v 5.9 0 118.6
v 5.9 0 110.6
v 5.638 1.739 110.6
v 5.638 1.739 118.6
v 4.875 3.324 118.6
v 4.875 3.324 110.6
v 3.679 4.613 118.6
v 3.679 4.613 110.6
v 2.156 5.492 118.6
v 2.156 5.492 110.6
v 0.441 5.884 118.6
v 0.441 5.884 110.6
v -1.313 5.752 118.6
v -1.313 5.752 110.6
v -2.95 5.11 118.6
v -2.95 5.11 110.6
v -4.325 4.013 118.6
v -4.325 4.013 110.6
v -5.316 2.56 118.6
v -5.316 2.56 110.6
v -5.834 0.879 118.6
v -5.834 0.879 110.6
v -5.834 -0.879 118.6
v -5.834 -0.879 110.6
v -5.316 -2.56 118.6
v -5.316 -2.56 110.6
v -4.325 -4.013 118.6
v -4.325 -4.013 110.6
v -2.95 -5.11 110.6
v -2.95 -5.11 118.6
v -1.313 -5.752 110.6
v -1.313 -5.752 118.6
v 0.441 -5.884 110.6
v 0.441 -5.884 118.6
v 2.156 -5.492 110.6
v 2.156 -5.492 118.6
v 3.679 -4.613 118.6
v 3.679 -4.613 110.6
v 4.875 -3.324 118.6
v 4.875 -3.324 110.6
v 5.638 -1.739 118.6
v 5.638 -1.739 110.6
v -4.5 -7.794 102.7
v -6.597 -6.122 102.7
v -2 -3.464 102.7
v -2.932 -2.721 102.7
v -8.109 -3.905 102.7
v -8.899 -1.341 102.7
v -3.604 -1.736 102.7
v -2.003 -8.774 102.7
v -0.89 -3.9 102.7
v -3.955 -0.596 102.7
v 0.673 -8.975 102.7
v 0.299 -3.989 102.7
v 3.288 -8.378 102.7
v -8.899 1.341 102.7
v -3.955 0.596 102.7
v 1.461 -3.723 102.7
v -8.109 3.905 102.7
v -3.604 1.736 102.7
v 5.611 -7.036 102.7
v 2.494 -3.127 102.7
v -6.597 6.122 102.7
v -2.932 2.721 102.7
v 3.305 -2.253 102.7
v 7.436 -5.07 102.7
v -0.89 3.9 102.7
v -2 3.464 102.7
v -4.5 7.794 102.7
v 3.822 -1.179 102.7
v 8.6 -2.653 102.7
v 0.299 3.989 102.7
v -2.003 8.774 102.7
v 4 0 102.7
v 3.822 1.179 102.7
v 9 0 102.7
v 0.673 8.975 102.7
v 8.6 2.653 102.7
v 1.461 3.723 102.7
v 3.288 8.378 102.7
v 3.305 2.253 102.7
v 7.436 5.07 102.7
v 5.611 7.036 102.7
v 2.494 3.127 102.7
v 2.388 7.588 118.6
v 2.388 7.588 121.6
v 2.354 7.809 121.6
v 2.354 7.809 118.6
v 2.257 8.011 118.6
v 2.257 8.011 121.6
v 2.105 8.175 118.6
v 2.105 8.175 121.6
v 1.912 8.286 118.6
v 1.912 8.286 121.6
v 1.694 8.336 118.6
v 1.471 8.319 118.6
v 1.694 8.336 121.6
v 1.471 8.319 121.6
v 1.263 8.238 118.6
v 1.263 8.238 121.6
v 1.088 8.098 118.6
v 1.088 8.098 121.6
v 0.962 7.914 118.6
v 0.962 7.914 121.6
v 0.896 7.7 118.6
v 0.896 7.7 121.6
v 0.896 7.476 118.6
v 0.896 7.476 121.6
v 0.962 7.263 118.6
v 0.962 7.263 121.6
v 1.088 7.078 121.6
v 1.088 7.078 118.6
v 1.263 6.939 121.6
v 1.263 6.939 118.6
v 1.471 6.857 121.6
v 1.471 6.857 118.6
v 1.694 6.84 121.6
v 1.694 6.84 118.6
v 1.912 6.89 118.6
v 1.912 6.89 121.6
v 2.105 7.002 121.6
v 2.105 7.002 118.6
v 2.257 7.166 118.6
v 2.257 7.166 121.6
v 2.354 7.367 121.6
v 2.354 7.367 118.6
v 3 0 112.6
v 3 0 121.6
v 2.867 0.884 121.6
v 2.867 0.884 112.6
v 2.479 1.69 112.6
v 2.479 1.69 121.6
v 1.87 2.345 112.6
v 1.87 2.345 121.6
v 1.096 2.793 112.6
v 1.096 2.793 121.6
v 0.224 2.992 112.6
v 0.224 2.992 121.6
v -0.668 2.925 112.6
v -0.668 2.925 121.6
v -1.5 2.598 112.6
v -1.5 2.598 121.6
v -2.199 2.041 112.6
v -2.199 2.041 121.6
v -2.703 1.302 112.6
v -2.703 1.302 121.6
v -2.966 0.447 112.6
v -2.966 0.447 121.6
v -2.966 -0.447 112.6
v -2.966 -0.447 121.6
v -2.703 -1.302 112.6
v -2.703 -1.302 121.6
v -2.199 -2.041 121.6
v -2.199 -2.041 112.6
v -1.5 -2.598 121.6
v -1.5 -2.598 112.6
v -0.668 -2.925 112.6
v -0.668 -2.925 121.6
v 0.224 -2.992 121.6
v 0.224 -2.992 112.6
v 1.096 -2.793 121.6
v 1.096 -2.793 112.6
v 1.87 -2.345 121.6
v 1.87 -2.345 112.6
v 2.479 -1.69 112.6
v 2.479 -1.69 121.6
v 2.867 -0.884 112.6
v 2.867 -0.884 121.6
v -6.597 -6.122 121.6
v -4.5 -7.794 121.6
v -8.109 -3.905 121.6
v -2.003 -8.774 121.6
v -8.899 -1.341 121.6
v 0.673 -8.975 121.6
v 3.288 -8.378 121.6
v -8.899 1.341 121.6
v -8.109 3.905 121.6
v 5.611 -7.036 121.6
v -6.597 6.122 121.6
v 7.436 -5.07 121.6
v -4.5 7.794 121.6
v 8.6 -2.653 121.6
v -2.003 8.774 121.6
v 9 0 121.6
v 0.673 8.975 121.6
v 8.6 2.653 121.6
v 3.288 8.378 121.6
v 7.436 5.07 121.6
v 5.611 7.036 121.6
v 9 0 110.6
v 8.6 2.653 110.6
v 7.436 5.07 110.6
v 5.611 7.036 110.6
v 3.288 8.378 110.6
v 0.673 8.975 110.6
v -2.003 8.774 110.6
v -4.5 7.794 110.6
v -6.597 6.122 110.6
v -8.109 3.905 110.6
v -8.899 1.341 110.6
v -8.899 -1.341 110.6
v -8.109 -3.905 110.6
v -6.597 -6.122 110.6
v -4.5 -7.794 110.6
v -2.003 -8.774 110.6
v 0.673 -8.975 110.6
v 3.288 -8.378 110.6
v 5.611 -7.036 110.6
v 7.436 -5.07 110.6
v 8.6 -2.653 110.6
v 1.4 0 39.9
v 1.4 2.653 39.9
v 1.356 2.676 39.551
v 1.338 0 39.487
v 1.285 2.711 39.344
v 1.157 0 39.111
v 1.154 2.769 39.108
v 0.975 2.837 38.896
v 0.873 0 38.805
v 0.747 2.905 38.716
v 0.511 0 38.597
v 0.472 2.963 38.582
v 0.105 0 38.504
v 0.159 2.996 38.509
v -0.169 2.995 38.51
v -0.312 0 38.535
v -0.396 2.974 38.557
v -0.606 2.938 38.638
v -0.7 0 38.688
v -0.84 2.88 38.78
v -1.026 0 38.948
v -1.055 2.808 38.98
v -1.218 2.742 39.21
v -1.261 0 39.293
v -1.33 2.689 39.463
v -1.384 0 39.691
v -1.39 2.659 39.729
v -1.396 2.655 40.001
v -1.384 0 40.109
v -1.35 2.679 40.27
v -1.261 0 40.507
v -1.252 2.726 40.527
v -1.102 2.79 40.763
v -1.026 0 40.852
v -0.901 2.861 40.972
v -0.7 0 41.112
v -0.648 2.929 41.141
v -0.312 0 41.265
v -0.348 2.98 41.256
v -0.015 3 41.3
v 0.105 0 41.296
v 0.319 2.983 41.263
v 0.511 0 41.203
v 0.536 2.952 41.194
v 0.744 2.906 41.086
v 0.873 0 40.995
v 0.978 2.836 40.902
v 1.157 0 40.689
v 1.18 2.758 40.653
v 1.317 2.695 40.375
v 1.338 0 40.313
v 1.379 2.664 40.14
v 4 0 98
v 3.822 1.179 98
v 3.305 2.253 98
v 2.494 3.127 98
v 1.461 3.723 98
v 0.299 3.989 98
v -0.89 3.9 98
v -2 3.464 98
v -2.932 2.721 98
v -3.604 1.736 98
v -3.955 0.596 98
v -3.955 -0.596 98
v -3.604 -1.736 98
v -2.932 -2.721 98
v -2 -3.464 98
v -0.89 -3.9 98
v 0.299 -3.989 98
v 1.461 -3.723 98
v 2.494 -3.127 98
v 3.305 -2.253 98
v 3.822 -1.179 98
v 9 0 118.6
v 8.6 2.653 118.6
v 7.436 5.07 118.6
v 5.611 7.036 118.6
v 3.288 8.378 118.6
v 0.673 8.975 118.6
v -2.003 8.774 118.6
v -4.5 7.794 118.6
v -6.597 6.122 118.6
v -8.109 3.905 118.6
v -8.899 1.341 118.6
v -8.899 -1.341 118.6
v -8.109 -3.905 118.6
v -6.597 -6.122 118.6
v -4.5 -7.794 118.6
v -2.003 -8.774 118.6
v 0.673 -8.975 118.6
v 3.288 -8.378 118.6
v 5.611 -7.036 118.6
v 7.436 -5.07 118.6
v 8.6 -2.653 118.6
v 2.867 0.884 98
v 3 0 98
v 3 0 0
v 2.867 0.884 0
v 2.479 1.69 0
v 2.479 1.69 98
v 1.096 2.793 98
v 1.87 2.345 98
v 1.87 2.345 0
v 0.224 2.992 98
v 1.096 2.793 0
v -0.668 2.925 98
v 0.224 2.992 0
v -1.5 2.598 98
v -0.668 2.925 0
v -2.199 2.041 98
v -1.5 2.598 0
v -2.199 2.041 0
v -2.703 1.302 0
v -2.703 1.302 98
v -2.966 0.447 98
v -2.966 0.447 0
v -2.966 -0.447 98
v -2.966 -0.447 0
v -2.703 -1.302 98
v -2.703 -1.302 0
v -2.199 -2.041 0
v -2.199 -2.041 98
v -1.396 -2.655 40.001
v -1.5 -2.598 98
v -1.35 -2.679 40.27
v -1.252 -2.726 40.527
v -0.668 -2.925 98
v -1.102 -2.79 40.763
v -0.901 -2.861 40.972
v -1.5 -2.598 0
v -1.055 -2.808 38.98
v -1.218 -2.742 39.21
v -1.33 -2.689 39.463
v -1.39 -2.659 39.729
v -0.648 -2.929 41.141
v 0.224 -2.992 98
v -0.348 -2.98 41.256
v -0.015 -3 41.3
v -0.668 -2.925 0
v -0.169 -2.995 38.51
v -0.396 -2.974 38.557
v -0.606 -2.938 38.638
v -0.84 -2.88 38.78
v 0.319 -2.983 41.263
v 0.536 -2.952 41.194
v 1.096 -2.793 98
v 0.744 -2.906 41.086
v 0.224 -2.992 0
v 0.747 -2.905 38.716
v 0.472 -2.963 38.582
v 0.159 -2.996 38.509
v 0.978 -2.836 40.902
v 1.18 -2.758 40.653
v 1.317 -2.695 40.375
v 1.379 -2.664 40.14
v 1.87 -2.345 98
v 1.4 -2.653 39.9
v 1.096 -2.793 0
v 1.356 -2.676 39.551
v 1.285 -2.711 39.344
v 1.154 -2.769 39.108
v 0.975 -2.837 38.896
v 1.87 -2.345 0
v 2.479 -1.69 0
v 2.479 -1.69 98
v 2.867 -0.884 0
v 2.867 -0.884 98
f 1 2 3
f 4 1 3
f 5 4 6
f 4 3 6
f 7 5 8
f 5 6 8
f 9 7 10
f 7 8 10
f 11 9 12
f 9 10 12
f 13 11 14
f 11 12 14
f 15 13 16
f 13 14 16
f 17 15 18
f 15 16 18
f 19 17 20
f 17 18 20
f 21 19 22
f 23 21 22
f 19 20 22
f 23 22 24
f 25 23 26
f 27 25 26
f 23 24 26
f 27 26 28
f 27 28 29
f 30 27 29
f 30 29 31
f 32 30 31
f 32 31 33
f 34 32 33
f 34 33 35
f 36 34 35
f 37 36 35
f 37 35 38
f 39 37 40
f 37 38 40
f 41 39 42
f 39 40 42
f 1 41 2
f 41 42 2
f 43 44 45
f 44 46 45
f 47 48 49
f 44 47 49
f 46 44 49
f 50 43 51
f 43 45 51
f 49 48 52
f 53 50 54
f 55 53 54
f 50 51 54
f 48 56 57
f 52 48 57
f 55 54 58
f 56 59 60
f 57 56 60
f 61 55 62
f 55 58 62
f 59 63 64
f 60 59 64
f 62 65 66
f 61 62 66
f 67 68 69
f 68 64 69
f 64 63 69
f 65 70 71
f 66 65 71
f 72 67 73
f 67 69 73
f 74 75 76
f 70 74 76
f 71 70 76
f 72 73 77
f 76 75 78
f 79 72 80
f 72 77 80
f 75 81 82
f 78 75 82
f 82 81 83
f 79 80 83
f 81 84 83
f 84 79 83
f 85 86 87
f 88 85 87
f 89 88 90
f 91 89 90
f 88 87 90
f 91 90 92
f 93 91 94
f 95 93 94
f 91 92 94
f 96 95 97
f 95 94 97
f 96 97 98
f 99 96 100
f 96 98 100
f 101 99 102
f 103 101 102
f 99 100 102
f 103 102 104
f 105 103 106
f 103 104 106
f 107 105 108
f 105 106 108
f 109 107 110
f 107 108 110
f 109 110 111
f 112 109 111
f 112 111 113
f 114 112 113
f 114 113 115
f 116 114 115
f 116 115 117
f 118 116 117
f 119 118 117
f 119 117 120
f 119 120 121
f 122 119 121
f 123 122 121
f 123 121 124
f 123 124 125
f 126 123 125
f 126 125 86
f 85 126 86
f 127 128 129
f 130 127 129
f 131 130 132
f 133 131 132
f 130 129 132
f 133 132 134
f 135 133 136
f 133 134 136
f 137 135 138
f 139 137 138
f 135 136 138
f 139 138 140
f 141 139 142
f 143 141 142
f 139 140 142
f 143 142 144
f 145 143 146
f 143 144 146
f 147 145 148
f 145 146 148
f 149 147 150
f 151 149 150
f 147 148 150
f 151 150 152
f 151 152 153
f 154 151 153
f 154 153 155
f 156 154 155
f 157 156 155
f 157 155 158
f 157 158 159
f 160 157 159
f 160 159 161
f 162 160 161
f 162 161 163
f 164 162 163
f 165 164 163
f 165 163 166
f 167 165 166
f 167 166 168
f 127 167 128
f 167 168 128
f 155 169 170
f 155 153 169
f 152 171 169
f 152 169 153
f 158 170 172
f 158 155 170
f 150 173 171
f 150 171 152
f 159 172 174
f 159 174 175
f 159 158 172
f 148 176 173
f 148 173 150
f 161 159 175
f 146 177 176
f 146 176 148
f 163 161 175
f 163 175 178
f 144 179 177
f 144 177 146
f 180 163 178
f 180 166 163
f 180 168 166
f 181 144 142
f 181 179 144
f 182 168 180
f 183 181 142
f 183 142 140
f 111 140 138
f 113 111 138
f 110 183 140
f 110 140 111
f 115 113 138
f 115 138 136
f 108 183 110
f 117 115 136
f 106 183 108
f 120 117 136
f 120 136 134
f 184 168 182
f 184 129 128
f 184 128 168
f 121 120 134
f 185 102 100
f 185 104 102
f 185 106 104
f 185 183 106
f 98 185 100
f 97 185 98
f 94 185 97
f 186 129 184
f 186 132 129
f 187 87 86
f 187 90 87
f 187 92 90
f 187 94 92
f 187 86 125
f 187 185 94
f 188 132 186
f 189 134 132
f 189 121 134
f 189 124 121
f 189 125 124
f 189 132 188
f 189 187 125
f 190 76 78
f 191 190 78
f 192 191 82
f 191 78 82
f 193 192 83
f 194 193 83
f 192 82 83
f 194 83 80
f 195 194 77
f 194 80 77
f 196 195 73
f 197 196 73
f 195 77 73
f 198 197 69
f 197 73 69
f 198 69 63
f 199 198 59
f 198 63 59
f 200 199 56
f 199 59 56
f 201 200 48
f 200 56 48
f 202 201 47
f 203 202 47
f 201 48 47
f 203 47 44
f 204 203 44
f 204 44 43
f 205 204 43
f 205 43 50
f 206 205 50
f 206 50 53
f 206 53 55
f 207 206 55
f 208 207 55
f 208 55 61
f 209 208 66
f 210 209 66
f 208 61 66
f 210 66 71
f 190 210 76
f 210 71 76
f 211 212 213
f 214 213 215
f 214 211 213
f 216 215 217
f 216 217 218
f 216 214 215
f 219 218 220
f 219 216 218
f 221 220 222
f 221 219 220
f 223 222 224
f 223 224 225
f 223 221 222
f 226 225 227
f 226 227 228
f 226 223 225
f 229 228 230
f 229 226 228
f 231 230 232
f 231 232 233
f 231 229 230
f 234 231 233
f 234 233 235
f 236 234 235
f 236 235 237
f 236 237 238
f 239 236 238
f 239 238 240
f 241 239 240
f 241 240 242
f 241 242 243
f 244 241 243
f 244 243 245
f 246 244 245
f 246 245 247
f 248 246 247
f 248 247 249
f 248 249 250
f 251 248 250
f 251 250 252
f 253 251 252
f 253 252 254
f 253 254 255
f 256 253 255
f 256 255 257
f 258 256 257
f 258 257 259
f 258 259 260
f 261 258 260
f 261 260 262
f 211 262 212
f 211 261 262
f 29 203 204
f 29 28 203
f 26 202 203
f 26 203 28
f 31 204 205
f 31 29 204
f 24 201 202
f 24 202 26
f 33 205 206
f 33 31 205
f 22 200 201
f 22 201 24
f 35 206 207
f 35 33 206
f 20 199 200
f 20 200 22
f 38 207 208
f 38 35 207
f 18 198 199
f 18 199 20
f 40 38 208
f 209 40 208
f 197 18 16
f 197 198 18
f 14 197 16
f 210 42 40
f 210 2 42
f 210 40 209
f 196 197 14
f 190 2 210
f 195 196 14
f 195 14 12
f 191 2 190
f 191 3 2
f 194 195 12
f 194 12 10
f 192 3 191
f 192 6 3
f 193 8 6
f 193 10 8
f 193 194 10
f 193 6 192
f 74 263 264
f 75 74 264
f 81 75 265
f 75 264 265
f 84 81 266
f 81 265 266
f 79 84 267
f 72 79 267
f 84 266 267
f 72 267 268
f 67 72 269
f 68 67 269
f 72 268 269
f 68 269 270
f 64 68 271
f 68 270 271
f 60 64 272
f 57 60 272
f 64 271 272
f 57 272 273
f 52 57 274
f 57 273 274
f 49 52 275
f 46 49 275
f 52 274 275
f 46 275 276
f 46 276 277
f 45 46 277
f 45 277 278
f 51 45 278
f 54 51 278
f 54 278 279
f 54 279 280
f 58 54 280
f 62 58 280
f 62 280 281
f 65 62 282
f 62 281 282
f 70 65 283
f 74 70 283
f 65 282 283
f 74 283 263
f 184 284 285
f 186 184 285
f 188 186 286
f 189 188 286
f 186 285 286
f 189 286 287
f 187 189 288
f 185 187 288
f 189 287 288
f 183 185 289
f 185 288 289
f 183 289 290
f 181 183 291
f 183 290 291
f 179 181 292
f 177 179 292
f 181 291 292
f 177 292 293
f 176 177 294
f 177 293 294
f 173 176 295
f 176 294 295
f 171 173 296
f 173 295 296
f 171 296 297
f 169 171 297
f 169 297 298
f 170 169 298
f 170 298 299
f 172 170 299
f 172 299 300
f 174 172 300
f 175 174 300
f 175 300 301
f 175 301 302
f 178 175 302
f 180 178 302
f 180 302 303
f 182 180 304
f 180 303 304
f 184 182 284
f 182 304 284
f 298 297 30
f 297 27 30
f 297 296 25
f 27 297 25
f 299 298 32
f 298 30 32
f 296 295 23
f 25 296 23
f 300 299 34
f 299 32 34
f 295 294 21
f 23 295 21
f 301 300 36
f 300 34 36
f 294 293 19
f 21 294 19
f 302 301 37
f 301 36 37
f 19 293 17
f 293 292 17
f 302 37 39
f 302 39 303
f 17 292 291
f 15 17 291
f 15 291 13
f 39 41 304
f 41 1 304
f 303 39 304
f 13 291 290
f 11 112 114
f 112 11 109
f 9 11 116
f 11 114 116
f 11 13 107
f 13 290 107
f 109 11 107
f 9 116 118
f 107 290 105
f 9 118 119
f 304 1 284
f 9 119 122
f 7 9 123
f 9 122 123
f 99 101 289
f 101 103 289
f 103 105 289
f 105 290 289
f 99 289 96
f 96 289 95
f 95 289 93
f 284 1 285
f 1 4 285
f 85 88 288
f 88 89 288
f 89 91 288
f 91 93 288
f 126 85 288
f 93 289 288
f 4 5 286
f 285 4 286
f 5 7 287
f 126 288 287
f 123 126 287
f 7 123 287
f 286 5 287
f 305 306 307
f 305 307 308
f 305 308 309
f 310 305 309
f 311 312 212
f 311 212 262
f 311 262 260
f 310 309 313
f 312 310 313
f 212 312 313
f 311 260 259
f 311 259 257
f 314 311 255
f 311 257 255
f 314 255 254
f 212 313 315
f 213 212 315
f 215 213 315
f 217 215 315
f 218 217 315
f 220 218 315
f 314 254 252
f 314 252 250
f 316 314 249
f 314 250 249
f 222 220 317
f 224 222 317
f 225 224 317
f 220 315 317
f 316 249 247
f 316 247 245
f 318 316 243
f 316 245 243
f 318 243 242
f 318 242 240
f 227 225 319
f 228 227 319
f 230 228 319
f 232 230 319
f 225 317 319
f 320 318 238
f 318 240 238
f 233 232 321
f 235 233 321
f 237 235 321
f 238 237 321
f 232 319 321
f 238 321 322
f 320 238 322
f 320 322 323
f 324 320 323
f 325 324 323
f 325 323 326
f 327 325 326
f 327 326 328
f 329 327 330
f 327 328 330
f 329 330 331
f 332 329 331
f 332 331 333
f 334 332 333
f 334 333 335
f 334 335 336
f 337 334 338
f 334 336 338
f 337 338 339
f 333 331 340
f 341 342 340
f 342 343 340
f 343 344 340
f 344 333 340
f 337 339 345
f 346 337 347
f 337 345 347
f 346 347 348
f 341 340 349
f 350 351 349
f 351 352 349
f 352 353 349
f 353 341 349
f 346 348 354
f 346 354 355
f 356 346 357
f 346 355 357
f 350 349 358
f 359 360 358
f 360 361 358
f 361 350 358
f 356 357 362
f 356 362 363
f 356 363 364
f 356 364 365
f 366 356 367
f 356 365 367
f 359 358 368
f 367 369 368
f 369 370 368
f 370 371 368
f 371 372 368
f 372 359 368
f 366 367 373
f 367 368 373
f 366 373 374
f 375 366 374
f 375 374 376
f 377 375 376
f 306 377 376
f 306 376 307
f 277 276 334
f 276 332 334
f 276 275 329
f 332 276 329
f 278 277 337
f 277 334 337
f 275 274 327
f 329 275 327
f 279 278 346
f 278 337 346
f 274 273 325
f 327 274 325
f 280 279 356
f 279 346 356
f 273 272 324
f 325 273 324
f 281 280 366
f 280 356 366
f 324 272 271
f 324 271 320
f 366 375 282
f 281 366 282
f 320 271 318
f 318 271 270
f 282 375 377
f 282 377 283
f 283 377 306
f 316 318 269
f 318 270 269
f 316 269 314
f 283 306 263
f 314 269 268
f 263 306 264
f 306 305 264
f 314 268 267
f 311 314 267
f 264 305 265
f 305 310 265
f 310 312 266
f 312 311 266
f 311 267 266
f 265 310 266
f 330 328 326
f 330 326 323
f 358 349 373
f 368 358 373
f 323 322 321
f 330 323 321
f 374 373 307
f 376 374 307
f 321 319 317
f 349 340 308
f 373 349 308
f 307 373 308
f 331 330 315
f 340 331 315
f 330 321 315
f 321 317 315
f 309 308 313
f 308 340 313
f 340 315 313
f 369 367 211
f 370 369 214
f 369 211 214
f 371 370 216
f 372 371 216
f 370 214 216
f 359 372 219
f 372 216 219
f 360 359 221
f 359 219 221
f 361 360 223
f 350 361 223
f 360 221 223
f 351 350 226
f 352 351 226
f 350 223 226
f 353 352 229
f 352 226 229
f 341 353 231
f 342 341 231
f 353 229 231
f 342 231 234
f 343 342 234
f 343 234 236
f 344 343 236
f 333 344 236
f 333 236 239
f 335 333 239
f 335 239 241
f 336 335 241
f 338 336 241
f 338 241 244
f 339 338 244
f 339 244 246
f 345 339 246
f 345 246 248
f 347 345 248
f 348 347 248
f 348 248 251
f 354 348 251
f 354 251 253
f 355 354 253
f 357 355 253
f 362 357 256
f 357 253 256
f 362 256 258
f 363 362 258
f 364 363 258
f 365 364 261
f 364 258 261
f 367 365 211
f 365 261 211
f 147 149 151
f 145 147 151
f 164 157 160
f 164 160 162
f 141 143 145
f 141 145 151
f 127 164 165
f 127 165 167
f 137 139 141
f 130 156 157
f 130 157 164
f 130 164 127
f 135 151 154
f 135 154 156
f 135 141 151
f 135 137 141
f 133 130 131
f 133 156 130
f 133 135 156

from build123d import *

# Parameters (mm, degrees)
SKETCH1_R               = 3
BOSS_EXTRUDE1_DEPTH     = 98
SKETCH2_R               = 4
BOSS_EXTRUDE2_DEPTH     = 4.7
SKETCH3_R               = 9
BOSS_EXTRUDE3_DEPTH     = 7.9
SKETCH4_R               = 5.9
BOSS_EXTRUDE4_DEPTH     = 8
SKETCH5_R               = 9
BOSS_EXTRUDE5_DEPTH     = 3
CUT_EXTRUDE1_DEPTH      = 82
CUT_EXTRUDE1_DEPTH_BACK = 82
SKETCH6_R               = 1.4
CUT_EXTRUDE2_START      = -9
SKETCH7_R               = 3
SKETCH7_R_2             = 0.75
CUT_EXTRUDE2_DEPTH      = 9


with BuildPart() as part:
    # Sketch1 → Boss-Extrude1 (new body)
    with BuildSketch(Plane.XY):
        Circle(SKETCH1_R)
    extrude(amount=BOSS_EXTRUDE1_DEPTH)

    # Sketch2 → Boss-Extrude2 (add)
    with BuildSketch(Plane.XY.offset(98)):
        Circle(SKETCH2_R)
    extrude(amount=BOSS_EXTRUDE2_DEPTH)

    # Sketch3 → Boss-Extrude3 (add)
    with BuildSketch(Plane.XY.offset(102.7)):
        Circle(SKETCH3_R)
    extrude(amount=BOSS_EXTRUDE3_DEPTH)

    # Sketch4 → Boss-Extrude4 (add)
    with BuildSketch(Plane.XY.offset(110.6)):
        Circle(SKETCH4_R)
    extrude(amount=BOSS_EXTRUDE4_DEPTH)

    # Sketch5 → Boss-Extrude5 (add)
    with BuildSketch(Plane.XY.offset(118.6)):
        Circle(SKETCH5_R)
    extrude(amount=BOSS_EXTRUDE5_DEPTH)

    # Sketch6 → Cut-Extrude1 (cut, two sides: drawn at the far end of the back side and taken through both)
    with BuildSketch(Plane(origin=(0, 0, 0), x_dir=(1, 0, 0), z_dir=(0, 1, 0)).offset(-CUT_EXTRUDE1_DEPTH_BACK)):
        with Locations((0, -39.9)):
            Circle(SKETCH6_R)
    extrude(amount=CUT_EXTRUDE1_DEPTH + CUT_EXTRUDE1_DEPTH_BACK, mode=Mode.SUBTRACT)

    # Sketch7 → Cut-Extrude2 (cut)
    with BuildSketch(Plane.XY.offset(121.6).offset(CUT_EXTRUDE2_START)):
        Circle(SKETCH7_R)
        with Locations((1.637751338, 7.588247864)):
            Circle(SKETCH7_R_2)
    extrude(amount=CUT_EXTRUDE2_DEPTH, mode=Mode.SUBTRACT)


solid = part.part
